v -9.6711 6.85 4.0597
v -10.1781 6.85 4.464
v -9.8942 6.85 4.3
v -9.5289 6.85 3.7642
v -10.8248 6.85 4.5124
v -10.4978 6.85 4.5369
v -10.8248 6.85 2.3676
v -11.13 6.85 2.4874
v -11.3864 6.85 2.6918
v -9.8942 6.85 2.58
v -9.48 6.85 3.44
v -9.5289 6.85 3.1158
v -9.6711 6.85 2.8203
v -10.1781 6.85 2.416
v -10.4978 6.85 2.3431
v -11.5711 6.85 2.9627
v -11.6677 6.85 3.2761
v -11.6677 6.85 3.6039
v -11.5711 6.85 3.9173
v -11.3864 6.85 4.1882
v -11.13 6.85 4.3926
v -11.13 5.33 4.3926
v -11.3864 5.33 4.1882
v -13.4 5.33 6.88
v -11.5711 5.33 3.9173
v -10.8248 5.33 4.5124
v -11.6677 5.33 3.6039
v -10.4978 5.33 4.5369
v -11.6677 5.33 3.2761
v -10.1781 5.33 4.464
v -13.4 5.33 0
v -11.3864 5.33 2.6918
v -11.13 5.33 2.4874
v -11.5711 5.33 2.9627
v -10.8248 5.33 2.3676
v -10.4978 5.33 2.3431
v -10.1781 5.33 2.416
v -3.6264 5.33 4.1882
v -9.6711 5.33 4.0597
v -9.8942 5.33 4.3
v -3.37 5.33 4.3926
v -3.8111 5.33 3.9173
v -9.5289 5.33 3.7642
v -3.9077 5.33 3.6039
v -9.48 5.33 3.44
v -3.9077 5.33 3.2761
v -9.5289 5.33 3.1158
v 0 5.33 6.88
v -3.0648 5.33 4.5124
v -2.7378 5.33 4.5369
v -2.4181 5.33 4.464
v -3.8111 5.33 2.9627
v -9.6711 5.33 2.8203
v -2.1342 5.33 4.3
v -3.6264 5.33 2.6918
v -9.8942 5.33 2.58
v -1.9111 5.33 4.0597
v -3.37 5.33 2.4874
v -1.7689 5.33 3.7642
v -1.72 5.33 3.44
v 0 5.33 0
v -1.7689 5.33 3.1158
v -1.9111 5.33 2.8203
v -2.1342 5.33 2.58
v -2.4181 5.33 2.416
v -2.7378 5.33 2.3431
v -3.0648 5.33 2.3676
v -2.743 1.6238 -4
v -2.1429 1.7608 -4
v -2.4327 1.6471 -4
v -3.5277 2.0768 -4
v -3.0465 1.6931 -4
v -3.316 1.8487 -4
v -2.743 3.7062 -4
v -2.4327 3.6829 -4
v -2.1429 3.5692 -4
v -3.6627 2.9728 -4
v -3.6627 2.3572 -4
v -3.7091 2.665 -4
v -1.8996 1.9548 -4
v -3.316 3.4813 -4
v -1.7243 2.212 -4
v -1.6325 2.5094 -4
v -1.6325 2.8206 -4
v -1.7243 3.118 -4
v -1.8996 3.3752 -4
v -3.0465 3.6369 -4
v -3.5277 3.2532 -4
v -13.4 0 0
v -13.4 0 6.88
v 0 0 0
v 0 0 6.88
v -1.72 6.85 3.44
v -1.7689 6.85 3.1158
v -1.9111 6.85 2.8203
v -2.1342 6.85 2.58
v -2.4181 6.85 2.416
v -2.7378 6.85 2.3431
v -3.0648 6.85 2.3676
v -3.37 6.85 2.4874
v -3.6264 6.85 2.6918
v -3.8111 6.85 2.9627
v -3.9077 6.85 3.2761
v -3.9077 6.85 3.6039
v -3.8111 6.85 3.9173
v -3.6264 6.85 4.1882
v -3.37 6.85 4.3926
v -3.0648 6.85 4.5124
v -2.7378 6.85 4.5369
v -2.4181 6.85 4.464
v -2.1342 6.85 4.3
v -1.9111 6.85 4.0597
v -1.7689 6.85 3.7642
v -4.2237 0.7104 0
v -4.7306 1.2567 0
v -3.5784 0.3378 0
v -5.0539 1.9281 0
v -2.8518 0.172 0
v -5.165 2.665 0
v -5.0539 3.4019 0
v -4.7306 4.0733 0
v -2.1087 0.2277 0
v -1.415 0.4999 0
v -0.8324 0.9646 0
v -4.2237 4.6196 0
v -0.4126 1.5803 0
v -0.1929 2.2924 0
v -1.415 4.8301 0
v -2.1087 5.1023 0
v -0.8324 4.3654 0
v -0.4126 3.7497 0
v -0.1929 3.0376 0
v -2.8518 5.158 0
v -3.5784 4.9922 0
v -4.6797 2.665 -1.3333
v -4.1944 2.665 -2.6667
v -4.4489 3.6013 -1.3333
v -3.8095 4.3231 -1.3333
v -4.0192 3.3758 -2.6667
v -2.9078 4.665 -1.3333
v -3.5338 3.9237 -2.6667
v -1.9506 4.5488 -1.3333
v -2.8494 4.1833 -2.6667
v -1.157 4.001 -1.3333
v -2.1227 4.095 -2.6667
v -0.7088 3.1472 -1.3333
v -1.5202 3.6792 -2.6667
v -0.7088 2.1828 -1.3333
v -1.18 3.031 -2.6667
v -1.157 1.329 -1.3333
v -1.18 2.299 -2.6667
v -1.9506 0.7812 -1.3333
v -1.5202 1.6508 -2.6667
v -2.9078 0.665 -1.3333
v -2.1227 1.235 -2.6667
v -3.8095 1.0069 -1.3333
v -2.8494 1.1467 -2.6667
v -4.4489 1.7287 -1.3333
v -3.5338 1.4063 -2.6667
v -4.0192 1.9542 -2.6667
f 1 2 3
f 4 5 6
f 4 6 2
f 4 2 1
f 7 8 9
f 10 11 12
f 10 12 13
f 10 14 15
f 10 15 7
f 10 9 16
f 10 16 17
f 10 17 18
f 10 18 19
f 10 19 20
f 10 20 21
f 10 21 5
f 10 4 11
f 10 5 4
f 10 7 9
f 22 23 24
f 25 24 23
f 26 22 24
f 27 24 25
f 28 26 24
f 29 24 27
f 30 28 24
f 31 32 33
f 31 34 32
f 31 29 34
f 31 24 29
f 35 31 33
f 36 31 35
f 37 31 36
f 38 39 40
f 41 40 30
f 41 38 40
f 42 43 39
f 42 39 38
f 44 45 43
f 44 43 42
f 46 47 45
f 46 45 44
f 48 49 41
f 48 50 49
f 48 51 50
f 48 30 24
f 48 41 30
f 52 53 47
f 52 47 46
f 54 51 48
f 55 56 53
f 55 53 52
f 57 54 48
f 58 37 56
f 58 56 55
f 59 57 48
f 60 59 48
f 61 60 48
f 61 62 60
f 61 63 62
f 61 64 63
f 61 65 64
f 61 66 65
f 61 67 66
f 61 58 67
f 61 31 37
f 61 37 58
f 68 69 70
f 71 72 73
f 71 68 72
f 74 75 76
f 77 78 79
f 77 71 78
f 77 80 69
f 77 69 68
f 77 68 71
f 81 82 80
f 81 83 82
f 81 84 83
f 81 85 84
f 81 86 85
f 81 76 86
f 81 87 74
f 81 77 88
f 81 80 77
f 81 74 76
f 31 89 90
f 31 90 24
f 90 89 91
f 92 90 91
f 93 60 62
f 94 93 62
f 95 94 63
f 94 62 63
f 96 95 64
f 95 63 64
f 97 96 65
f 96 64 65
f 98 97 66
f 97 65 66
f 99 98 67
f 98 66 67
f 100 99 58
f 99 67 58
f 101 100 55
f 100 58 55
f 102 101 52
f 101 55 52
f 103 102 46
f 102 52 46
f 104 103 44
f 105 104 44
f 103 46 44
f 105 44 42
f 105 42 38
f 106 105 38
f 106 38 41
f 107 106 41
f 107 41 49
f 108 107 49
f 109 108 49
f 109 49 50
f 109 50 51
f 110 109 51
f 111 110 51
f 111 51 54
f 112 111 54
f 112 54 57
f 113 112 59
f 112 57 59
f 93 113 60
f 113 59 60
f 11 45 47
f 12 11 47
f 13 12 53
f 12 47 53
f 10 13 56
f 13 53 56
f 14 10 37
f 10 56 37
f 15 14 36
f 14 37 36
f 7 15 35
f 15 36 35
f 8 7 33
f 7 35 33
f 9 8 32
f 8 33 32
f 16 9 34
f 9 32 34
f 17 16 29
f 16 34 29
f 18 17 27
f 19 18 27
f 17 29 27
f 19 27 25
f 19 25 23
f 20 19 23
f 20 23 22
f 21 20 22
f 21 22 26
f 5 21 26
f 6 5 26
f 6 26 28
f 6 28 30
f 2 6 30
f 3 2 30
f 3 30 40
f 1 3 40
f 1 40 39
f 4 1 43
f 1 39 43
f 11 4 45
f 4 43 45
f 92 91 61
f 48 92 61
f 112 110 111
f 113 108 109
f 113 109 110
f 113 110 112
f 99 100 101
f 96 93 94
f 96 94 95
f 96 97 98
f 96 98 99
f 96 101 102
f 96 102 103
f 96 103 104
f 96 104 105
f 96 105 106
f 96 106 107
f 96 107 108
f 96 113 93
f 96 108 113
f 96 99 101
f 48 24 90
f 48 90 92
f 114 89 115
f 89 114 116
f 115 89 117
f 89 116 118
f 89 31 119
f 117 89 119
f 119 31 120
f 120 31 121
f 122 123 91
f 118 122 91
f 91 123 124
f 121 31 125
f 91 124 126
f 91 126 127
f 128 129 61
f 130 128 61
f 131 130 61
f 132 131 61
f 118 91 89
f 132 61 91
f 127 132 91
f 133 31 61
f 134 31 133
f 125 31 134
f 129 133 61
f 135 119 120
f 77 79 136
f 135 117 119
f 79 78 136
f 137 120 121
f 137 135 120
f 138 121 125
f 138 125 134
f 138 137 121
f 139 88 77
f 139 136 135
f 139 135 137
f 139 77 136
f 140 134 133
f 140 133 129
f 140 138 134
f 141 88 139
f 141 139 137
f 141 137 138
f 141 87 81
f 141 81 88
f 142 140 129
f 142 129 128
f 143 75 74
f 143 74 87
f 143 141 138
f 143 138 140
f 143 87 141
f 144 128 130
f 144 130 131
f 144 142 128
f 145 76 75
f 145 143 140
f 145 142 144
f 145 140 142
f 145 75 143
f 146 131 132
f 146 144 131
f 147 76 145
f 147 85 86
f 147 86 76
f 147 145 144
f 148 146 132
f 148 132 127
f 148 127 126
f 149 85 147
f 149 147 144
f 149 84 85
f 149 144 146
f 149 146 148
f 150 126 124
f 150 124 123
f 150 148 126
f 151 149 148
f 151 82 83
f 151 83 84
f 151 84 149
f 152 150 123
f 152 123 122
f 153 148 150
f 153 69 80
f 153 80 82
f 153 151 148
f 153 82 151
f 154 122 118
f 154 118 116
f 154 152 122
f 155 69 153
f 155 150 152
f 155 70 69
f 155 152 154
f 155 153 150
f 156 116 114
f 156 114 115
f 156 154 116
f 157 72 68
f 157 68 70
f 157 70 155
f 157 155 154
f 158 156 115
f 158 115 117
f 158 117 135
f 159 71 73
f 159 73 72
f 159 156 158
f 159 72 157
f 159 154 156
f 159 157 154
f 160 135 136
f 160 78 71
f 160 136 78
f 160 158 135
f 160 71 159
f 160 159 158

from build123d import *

# Parameters (mm, degrees)
SKETCH1_W           = 13.4
SKETCH1_H           = 5.33
BOSS_EXTRUDE1_DEPTH = 6.88
SKETCH2_R           = 1.1
BOSS_EXTRUDE2_DEPTH = 1.52
SKETCH3_R           = 2.5
BOSS_EXTRUDE3_DEPTH = 4
BOSS_EXTRUDE3_TAPER = 20


with BuildPart() as part:
    # Sketch1 → Boss-Extrude1 (new body)
    with BuildSketch(Plane.XY):
        with Locations((-6.7, 2.665)):
            Rectangle(SKETCH1_W, SKETCH1_H)
    extrude(amount=BOSS_EXTRUDE1_DEPTH)

    # Sketch2 → Boss-Extrude2 (add)
    with BuildSketch(Plane(origin=(0, 5.33, 0), x_dir=(1, 0, 0), z_dir=(0, 1, 0))):
        with Locations((-10.58, -3.44)):
            Circle(SKETCH2_R)
        with Locations((-2.82, -3.44)):
            Circle(SKETCH2_R)
    extrude(amount=BOSS_EXTRUDE2_DEPTH)

    # Sketch3 → Boss-Extrude3 (add)
    with BuildSketch(Plane(origin=(0, 0, 0), x_dir=(-1, 0, 0), z_dir=(0, 0, -1))):
        with Locations((2.665, 2.665)):
            Circle(SKETCH3_R)
    extrude(amount=BOSS_EXTRUDE3_DEPTH, taper=BOSS_EXTRUDE3_TAPER)


solid = part.part
